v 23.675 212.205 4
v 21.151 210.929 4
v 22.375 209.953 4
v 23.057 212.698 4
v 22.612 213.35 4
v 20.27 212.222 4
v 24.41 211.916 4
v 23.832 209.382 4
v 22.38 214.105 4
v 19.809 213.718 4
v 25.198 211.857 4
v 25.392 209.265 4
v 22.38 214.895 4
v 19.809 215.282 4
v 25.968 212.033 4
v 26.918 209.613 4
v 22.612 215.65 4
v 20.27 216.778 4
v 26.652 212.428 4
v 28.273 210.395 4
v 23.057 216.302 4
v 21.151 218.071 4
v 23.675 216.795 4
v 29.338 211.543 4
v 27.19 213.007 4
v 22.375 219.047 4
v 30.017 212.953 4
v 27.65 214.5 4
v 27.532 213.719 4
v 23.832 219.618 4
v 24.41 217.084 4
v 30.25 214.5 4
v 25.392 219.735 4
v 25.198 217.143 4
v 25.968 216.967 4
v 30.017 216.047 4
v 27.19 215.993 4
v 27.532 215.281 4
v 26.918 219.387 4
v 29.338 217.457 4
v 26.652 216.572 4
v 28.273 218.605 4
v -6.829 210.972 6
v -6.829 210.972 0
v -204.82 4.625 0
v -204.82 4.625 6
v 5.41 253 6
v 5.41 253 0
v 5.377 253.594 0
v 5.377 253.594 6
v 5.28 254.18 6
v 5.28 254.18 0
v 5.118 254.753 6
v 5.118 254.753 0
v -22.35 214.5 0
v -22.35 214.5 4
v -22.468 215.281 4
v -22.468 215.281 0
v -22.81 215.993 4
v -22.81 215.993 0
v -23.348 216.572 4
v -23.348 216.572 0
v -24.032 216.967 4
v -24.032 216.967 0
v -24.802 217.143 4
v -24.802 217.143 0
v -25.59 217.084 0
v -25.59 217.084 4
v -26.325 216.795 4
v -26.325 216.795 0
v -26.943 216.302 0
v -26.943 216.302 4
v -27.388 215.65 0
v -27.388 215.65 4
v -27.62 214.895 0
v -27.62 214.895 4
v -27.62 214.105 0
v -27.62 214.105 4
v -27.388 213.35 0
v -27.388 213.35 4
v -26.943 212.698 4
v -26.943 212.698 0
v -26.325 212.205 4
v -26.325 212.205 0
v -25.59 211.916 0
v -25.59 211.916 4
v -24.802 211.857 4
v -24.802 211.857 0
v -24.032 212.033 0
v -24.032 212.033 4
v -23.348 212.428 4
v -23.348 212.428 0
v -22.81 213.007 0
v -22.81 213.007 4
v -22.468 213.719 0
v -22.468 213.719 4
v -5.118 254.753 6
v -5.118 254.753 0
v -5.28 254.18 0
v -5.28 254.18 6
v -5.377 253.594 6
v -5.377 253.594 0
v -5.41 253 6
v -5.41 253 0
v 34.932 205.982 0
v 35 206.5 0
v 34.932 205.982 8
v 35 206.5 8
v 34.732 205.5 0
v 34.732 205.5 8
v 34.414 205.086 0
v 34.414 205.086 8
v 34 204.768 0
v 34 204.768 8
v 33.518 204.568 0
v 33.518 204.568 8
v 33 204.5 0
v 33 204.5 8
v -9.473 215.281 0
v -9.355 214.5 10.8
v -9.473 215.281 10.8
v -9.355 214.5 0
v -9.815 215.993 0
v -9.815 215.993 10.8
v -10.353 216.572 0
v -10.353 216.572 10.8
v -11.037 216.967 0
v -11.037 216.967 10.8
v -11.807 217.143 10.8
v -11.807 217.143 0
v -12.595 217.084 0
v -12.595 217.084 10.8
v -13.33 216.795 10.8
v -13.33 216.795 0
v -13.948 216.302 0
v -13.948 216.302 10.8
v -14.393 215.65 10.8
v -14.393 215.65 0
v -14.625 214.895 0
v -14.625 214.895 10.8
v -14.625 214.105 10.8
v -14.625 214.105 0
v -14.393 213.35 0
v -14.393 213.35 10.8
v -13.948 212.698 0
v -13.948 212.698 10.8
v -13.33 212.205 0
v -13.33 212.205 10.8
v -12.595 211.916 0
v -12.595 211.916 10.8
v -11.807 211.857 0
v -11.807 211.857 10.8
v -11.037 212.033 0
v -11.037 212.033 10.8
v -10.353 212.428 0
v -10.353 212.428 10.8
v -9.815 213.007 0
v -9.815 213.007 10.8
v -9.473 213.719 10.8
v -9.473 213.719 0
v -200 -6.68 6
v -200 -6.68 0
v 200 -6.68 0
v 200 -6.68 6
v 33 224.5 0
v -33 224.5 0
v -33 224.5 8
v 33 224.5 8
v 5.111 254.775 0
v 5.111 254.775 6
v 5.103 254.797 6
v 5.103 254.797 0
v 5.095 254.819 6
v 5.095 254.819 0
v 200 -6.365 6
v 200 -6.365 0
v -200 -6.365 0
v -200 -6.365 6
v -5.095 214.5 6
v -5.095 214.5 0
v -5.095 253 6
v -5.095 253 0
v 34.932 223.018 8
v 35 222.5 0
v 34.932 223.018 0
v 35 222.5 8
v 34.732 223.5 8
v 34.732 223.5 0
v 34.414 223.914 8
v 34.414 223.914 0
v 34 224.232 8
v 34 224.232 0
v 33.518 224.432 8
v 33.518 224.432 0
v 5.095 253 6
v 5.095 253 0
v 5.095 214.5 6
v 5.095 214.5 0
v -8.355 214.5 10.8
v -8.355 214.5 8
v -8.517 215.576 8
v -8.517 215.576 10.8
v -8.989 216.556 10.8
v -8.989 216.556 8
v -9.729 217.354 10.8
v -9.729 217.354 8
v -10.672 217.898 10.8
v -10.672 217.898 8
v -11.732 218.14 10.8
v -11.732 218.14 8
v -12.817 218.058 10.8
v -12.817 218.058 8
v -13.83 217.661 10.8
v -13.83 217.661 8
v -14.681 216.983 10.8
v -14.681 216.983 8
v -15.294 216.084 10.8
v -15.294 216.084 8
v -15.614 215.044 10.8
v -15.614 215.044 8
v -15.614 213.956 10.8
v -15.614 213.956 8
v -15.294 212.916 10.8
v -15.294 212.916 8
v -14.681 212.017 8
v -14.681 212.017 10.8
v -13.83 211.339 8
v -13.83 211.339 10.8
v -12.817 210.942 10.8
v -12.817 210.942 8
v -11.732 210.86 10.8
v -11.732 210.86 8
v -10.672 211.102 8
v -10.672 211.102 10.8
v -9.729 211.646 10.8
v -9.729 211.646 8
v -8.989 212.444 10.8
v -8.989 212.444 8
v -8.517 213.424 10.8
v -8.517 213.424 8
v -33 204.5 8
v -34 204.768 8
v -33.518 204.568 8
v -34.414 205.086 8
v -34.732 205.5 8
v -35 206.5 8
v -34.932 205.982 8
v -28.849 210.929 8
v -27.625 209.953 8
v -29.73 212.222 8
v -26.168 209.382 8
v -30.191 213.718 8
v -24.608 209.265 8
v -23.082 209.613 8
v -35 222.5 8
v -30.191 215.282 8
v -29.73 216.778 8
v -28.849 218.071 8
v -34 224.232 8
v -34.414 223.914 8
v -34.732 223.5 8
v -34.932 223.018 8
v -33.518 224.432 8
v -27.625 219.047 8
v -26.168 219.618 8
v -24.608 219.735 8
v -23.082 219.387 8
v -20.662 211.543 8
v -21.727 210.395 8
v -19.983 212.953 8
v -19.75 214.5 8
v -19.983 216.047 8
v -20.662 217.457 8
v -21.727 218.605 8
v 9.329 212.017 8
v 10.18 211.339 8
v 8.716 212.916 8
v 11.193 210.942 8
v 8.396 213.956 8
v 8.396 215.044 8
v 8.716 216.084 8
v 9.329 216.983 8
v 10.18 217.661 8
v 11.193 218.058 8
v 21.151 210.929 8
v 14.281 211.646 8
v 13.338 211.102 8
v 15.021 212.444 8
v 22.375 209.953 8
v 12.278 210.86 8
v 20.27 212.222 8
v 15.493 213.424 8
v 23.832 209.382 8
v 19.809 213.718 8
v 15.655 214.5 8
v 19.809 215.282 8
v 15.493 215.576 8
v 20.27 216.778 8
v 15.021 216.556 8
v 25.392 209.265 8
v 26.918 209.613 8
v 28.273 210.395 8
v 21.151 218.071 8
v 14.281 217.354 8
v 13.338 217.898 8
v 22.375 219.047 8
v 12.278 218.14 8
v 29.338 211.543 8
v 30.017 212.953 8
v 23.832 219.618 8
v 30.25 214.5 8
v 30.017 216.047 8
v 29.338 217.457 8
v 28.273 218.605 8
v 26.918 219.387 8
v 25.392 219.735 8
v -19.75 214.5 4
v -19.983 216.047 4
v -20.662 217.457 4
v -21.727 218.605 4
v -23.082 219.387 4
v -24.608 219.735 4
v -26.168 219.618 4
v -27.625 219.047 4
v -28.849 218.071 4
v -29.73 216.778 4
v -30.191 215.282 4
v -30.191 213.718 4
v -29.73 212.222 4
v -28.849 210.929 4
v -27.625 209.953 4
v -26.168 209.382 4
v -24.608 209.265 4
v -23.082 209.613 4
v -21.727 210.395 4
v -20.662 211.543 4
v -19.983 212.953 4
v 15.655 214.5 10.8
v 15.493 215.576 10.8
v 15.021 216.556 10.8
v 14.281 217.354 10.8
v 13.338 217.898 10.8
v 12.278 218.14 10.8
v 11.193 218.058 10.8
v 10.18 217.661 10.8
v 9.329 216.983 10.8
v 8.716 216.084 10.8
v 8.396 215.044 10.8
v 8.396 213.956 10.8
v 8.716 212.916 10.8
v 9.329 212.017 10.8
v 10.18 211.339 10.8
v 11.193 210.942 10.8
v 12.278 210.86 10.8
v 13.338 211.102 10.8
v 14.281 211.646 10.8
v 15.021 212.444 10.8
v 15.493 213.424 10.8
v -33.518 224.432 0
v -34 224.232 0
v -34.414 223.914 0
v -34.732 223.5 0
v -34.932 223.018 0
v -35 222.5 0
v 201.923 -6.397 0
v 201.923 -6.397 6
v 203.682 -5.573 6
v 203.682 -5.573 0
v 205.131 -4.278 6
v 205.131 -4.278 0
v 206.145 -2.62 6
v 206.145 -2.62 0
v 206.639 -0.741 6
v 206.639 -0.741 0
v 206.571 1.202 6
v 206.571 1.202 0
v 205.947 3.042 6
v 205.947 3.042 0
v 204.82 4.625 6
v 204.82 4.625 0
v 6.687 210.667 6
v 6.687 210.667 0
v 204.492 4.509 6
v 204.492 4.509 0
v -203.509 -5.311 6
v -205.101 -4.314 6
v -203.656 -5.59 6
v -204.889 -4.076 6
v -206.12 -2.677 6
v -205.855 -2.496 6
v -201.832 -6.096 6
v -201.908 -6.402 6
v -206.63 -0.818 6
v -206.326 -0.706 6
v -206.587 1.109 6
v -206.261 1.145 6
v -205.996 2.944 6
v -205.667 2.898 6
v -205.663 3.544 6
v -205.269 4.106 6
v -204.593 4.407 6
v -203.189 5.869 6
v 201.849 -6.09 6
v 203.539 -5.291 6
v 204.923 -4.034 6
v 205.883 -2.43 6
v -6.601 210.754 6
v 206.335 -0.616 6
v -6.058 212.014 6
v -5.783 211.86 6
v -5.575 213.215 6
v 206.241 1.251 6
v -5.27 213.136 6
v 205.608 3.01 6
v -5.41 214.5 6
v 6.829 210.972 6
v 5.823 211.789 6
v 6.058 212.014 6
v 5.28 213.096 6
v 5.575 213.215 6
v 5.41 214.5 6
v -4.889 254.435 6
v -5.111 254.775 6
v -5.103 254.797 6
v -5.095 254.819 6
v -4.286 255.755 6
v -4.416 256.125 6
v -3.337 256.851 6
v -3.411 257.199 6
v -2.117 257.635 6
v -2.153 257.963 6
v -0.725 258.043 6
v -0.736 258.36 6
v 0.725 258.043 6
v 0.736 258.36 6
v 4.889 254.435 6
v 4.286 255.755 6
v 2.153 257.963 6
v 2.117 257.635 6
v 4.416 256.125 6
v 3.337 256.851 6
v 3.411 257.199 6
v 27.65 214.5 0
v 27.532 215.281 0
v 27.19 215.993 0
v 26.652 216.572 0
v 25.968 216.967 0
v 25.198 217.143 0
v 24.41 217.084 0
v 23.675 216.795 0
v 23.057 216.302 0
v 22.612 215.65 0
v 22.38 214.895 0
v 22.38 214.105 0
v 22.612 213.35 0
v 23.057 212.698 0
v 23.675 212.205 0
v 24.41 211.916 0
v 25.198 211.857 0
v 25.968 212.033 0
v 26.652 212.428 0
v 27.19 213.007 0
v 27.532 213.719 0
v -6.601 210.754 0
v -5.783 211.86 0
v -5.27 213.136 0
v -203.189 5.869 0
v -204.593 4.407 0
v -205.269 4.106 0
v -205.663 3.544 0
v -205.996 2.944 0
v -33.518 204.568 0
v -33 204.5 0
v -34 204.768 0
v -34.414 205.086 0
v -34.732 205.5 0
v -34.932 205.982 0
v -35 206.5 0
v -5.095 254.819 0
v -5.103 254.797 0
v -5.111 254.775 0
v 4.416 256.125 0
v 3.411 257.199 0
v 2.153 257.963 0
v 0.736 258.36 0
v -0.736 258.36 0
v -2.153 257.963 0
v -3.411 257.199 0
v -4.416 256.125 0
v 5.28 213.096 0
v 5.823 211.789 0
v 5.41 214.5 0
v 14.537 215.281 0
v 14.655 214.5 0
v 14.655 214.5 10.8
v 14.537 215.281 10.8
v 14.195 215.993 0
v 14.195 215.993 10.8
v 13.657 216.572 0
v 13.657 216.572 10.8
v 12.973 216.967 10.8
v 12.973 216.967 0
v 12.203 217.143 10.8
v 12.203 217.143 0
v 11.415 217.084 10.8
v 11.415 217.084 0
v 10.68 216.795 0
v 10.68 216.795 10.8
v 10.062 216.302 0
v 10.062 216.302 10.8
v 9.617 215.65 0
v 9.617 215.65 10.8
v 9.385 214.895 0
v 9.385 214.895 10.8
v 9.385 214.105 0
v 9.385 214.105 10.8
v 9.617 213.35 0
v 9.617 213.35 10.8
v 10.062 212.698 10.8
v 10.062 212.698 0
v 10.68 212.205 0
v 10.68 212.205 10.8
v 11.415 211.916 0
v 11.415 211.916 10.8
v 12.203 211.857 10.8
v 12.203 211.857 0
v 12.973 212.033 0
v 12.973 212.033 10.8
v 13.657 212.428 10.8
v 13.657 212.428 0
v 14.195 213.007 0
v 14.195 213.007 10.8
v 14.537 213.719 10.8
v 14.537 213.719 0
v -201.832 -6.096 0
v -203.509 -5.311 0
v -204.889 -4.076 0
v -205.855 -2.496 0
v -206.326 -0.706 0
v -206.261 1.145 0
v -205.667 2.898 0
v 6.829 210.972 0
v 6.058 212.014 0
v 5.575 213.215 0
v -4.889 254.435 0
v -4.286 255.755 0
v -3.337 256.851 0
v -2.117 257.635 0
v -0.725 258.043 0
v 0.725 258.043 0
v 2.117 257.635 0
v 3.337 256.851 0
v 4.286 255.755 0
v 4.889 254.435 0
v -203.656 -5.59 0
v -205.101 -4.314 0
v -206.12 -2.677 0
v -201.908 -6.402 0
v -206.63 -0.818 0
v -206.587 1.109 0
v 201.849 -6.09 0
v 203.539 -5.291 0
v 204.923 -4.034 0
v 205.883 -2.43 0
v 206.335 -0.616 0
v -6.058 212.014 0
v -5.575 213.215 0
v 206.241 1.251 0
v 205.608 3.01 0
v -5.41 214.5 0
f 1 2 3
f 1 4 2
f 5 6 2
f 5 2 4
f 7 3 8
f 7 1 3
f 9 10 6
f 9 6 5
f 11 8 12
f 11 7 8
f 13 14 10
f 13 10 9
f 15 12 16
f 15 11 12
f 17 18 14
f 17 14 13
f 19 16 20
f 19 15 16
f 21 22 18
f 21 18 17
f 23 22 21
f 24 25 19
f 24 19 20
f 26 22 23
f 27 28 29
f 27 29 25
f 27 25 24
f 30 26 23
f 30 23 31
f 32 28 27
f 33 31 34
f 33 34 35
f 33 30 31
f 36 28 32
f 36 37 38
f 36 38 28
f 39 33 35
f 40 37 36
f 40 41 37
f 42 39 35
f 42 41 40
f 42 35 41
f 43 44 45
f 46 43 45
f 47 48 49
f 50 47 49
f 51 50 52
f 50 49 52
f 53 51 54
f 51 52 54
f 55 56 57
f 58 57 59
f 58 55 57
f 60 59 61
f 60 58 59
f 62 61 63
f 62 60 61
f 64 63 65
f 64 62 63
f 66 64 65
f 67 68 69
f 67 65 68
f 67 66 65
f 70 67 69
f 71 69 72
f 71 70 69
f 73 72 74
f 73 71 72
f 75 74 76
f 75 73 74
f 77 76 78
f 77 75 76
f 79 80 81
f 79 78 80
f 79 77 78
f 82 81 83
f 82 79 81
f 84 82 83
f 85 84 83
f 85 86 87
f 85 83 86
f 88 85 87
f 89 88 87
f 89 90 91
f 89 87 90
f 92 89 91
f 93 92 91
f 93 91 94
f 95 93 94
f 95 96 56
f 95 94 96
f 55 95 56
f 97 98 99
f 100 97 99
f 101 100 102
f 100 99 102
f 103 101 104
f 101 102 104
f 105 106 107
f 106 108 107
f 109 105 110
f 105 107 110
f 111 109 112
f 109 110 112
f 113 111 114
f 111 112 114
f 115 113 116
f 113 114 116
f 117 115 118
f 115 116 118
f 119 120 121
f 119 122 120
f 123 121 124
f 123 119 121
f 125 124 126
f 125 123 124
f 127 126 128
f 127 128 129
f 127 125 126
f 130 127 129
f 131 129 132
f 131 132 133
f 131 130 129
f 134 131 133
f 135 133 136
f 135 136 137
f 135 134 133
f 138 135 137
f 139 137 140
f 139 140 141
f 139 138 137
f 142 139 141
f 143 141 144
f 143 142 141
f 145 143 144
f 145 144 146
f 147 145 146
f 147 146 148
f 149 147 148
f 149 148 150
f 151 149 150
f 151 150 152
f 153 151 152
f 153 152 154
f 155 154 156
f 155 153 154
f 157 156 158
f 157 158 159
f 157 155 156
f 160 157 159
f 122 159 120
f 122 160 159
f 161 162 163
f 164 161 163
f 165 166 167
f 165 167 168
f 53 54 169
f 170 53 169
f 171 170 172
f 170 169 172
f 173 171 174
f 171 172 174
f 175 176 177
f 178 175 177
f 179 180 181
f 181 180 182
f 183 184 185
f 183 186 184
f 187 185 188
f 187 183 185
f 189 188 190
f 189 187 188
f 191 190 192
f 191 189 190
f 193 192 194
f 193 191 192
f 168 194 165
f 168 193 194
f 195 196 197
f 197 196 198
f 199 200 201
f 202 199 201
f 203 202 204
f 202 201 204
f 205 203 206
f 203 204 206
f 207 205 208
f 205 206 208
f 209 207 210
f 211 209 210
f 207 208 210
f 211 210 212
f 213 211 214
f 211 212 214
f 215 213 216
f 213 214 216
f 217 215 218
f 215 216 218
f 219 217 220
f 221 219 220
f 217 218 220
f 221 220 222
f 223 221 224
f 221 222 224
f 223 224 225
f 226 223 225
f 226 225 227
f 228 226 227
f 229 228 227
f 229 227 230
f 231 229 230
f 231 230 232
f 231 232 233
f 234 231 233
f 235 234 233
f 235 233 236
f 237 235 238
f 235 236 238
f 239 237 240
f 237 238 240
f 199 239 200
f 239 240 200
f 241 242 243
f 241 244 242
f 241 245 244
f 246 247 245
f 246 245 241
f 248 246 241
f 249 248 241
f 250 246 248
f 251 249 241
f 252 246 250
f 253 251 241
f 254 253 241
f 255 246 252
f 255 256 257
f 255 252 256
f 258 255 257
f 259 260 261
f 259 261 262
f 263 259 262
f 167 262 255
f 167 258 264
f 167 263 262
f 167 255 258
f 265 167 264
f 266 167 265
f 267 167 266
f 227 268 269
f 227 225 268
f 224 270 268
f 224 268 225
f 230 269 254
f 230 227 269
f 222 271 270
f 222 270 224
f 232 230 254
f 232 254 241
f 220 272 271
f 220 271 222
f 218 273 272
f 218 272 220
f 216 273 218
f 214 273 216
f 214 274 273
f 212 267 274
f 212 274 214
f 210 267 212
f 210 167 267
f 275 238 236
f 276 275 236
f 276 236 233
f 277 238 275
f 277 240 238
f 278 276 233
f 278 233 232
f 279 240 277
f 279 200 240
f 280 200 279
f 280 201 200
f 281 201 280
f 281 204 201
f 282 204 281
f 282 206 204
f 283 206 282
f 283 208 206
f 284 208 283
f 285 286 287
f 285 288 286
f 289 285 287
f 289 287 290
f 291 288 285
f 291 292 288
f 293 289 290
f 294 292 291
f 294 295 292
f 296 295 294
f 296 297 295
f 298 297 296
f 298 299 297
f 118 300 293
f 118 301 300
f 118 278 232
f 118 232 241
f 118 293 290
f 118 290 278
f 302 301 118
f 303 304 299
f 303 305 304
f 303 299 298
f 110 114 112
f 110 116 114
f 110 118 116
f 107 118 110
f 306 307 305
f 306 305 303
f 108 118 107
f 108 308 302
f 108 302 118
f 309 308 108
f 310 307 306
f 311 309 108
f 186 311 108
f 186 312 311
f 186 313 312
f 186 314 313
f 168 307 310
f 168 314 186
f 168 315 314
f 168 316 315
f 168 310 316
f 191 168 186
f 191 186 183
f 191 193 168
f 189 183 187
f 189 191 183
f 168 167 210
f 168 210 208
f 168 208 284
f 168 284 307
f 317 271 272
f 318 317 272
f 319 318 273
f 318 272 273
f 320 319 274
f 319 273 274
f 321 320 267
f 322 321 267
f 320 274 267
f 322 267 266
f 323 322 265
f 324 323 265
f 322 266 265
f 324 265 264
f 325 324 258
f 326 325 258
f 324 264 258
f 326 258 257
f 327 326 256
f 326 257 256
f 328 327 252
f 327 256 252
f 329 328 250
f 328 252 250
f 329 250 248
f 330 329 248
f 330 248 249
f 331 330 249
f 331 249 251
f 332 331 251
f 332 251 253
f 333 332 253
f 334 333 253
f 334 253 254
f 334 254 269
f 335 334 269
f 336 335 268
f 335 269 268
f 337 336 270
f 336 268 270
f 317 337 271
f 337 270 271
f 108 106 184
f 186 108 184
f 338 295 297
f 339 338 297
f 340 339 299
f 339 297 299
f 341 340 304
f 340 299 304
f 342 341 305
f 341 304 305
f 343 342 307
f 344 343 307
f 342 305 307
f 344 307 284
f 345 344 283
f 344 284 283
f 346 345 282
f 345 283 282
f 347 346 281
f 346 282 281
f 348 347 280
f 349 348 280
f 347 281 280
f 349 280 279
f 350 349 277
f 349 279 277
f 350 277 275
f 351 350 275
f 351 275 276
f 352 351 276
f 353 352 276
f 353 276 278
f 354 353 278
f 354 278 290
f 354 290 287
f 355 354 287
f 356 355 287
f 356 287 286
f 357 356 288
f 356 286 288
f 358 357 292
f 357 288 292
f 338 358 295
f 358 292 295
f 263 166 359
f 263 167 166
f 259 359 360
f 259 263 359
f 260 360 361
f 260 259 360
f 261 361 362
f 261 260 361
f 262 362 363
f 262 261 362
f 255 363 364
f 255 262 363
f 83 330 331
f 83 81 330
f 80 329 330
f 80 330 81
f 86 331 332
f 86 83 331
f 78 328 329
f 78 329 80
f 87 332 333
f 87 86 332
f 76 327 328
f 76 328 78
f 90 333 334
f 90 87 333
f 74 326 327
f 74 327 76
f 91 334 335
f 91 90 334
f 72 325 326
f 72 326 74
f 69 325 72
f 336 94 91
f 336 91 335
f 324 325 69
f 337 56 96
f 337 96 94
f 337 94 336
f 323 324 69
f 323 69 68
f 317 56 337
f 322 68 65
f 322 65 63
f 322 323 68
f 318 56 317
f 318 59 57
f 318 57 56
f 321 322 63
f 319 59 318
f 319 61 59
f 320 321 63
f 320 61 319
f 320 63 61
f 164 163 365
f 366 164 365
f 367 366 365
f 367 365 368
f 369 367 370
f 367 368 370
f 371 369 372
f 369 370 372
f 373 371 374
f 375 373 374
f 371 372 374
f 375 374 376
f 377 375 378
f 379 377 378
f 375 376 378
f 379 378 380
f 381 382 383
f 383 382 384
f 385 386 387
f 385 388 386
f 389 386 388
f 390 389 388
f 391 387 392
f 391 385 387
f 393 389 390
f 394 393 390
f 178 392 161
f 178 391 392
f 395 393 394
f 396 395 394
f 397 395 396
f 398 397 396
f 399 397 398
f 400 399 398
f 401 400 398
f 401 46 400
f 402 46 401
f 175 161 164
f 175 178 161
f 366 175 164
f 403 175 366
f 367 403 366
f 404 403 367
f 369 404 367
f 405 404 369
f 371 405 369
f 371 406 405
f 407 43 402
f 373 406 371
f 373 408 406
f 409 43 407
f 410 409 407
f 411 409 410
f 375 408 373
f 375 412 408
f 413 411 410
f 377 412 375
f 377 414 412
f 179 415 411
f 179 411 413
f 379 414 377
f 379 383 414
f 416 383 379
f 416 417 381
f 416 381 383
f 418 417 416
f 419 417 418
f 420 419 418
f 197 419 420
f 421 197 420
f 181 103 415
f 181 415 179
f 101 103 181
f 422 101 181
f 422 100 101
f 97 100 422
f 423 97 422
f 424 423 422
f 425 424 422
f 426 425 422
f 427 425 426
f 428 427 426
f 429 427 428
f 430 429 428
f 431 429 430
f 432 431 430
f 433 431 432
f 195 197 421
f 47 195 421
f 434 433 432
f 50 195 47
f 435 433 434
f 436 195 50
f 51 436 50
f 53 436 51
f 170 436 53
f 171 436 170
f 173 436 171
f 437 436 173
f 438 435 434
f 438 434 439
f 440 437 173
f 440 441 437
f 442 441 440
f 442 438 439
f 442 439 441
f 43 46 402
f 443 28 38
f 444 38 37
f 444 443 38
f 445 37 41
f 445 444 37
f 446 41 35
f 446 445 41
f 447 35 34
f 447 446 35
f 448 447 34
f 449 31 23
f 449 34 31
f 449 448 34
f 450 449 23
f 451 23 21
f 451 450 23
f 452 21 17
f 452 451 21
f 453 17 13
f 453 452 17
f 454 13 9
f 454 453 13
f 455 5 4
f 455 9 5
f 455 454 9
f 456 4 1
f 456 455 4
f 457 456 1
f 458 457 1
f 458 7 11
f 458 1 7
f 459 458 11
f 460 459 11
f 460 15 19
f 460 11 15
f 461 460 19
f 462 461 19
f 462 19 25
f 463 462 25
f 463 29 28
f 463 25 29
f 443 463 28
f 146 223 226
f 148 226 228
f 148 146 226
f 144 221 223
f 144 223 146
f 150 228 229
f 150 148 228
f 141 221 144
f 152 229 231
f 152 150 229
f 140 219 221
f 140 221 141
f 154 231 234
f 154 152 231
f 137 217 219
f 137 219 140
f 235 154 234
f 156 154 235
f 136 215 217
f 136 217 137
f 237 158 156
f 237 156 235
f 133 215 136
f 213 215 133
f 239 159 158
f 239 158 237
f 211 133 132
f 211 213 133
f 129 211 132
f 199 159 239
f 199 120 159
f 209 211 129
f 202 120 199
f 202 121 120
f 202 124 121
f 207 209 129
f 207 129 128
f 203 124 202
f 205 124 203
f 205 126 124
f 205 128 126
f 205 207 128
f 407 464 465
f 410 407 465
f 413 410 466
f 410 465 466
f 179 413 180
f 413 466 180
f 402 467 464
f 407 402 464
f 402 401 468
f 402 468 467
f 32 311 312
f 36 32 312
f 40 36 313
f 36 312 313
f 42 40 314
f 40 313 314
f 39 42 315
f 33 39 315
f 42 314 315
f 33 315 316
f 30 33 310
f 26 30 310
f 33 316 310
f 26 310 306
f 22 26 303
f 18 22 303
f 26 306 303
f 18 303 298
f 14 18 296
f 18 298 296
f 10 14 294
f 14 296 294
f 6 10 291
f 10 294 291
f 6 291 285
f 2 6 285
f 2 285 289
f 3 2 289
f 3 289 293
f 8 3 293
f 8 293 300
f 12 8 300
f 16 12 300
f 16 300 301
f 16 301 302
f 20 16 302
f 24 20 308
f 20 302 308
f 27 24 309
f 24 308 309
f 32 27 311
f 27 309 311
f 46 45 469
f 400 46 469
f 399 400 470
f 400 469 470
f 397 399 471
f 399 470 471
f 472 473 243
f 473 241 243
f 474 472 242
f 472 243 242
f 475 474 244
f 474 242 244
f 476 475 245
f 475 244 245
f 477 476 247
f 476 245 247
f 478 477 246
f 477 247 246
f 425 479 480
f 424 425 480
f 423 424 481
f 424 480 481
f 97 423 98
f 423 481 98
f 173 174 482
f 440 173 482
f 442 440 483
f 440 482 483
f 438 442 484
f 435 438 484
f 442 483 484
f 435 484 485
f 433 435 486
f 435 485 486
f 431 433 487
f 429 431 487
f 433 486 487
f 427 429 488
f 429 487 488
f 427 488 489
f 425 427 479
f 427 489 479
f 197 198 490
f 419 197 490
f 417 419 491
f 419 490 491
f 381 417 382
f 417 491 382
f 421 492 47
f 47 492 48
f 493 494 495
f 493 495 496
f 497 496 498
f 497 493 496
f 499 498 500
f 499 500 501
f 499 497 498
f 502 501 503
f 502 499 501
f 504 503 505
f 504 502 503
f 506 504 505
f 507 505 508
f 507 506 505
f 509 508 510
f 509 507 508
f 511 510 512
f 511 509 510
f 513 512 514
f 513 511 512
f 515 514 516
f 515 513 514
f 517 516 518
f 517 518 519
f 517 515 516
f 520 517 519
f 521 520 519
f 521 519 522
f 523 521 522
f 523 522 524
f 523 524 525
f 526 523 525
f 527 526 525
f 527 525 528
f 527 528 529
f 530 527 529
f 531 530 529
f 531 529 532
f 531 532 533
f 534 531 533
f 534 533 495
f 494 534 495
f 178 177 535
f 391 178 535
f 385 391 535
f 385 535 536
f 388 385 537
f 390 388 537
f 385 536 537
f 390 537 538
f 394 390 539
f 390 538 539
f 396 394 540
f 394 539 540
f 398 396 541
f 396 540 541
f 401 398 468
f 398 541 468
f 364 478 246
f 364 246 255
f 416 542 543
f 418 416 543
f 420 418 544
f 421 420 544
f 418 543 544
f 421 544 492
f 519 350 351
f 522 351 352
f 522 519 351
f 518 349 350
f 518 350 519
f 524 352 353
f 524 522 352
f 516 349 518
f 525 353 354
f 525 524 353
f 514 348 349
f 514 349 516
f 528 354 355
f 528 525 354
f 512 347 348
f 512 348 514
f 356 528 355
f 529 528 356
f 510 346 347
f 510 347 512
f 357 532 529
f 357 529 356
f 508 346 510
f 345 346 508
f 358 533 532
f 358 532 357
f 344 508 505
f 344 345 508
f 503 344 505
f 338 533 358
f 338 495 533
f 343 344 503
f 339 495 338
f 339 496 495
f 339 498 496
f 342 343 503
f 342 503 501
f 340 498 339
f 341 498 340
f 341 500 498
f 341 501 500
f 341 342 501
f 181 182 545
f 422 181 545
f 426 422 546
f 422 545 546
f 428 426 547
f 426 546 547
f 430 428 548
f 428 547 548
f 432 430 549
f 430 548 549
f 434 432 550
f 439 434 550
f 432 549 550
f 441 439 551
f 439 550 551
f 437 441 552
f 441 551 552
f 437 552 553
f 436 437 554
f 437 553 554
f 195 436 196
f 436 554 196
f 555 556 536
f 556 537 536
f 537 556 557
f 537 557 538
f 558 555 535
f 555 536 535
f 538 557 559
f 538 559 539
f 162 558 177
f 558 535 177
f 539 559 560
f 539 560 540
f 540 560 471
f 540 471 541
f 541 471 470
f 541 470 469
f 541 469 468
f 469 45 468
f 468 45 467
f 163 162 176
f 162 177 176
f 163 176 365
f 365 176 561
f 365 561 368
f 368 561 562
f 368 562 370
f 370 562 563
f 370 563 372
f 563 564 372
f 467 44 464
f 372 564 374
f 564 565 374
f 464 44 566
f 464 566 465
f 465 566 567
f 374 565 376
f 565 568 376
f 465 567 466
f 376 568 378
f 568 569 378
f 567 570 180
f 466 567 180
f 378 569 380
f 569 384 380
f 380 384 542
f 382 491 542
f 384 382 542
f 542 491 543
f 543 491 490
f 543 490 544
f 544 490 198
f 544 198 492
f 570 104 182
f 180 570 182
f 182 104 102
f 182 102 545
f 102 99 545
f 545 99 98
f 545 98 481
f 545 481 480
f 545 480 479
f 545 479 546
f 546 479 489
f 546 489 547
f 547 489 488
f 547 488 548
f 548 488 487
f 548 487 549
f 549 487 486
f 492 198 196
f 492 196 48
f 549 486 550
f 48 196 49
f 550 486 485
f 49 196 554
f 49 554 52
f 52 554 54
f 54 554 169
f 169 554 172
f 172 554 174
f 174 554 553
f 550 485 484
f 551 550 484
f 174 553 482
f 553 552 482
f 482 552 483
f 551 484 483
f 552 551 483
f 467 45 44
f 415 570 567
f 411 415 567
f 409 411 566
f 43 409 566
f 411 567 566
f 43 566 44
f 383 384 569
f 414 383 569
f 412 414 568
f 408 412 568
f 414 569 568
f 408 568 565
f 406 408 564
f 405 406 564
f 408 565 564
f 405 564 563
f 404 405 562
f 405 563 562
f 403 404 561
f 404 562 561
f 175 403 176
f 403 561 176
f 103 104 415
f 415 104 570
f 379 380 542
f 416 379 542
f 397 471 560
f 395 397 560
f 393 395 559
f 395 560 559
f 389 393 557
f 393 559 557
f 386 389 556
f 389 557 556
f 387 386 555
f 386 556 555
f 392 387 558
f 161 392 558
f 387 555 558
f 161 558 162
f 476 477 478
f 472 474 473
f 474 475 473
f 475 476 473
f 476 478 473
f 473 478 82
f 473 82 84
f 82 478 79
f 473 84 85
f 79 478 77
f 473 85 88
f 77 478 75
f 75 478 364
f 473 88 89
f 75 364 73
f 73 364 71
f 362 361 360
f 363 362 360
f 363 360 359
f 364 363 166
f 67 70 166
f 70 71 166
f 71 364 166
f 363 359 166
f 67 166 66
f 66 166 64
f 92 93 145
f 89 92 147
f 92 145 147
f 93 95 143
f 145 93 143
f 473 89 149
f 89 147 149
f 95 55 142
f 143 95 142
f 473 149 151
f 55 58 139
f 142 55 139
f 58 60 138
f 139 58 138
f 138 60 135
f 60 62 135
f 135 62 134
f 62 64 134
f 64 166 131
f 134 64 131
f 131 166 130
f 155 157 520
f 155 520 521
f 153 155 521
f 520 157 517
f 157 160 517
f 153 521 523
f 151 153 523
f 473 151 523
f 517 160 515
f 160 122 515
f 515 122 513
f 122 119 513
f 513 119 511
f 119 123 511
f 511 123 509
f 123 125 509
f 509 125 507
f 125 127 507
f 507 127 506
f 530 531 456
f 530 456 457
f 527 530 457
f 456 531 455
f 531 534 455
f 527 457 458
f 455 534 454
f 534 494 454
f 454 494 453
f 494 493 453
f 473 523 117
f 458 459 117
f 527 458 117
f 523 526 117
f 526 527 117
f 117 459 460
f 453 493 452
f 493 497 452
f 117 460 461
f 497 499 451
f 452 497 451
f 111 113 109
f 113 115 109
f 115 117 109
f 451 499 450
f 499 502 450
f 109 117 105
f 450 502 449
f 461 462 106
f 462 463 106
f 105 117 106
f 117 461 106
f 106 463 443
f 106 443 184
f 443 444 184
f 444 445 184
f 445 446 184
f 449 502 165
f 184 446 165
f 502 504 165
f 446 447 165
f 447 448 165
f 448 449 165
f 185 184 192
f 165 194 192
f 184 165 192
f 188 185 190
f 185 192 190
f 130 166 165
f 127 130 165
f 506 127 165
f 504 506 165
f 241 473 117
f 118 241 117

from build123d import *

# Parameters (mm, degrees)
F1_DEPTH = 6
F2_W     = 70
F2_H     = 20
F2_R     = 2.65
F3_DEPTH = 8
F4_R     = 5.25
F5_DEPTH = 4
F6_R     = 3.65
F6_R_2   = 2.65
F7_DEPTH = 2.8
F8_R     = 2


with BuildPart() as f1:
    # F0 (on Top) → F1 (new body)
    with BuildSketch(Plane.XY):
        with BuildLine():
            ThreePointArc((-200, -6.365), (-205.8550143362, -2.496403838), (-204.5927667748, 4.4067809513))
            Line((-204.5927667748, 4.4067809513), (-205.9962283404, 2.9440865629))
            ThreePointArc((-205.9962283404, 2.9440865629), (-205.6696074926, -3.5324143132), (-200, -6.68))
            Line((-200, -6.68), (200, -6.68))
            ThreePointArc((200, -6.68), (206.144775239, -2.6199498588), (204.8200607843, 4.6248690831))
            Line((204.8200607843, 4.6248690831), (6.828621303, 210.9724988056))
            ThreePointArc((6.828621303, 210.9724988056), (5.7779409533, 212.5989640273), (5.41, 214.5))
            Line((5.41, 214.5), (5.41, 253))
            ThreePointArc((5.41, 253), (5.3365496239, 253.8884470225), (5.1181929347, 254.7527695466))
            Line((5.1181929347, 254.7527695466), (5.095, 254.7818723))
            Line((5.095, 254.7818723), (5.095, 254.8190863091))
            ThreePointArc((5.095, 254.8190863091), (0, 258.41), (-5.095, 254.8190863091))
            Line((-5.095, 254.8190863091), (-5.095, 254.7818723))
            Line((-5.095, 254.7818723), (-5.1181929347, 254.7527695466))
            ThreePointArc((-5.1181929347, 254.7527695466), (-5.3365496239, 253.8884470225), (-5.41, 253))
            Line((-5.41, 253), (-5.41, 214.5))
            ThreePointArc((-5.41, 214.5), (-5.7779409533, 212.5989640273), (-6.828621303, 210.9724988056))
            Line((-6.828621303, 210.9724988056), (-204.8200607843, 4.6248690831))
            ThreePointArc((-204.8200607843, 4.6248690831), (-204.052746223, 5.3101457656), (-203.1893066572, 5.8694738304))
            Line((-203.1893066572, 5.8694738304), (-6.6013280175, 210.7544099192))
            ThreePointArc((-6.6013280175, 210.7544099192), (-5.4856890201, 212.481431872), (-5.095, 214.5))
            Line((-5.095, 214.5), (-5.095, 253))
            ThreePointArc((-5.095, 253), (0, 258.095), (5.095, 253))
            Line((5.095, 253), (5.095, 214.5))
            ThreePointArc((5.095, 214.5), (5.5088128874, 212.4248579962), (6.6869461501, 210.6671727408))
            Line((6.6869461501, 210.6671727408), (204.4920356293, 4.5094169141))
            ThreePointArc((204.4920356293, 4.5094169141), (205.8828421557, -2.4301014734), (200, -6.365))
            Line((200, -6.365), (-200, -6.365))
        make_face()
        with BuildLine():
            Line((-205.9962283404, 2.9440865629), (-204.5927667748, 4.4067809513))
            Line((-204.5927667748, 4.4067809513), (-203.1893066572, 5.8694738304))
            ThreePointArc((-203.1893066572, 5.8694738304), (-204.052746223, 5.3101457656), (-204.8200607843, 4.6248690831))
            ThreePointArc((-204.8200607843, 4.6248690831), (-205.4730508016, 3.8298975081), (-205.9962283404, 2.9440865629))
        make_face()
        with BuildLine():
            ThreePointArc((-5.095, 254.8190863091), (-5.1067041189, 254.7859655768), (-5.1181929347, 254.7527695466))
            Line((-5.1181929347, 254.7527695466), (-5.095, 254.7818723))
            Line((-5.095, 254.7818723), (-5.095, 254.8190863091))
        make_face()
        with BuildLine():
            ThreePointArc((5.1181929347, 254.7527695466), (5.1067041189, 254.7859655768), (5.095, 254.8190863091))
            Line((5.095, 254.8190863091), (5.095, 254.7818723))
            Line((5.095, 254.7818723), (5.1181929347, 254.7527695466))
        make_face()
    extrude(amount=F1_DEPTH)


with BuildPart() as f3:
    # F2 (on Top) → F3 (new body)
    with BuildSketch(Plane.XY):
        with Locations((0, 214.5)):
            Rectangle(F2_W, F2_H)
        with Locations((-25, 214.5)):
            Circle(F2_R, mode=Mode.SUBTRACT)
        with Locations((-12.005, 214.5)):
            Circle(F2_R, mode=Mode.SUBTRACT)
        with Locations((12.005, 214.5)):
            Circle(F2_R, mode=Mode.SUBTRACT)
        with Locations((25, 214.5)):
            Circle(F2_R, mode=Mode.SUBTRACT)
    extrude(amount=F3_DEPTH)

    # F4 (on face) → F5 (cut)
    with BuildSketch(Plane.XY.offset(8)):
        with Locations((-25, 214.5)):
            Circle(F4_R)
        with Locations((25, 214.5)):
            Circle(F4_R)
    extrude(amount=-F5_DEPTH, mode=Mode.SUBTRACT)

    # F6 (on face) → F7 (join)
    with BuildSketch(Plane.XY.offset(8)):
        with Locations((-12.005, 214.5)):
            Circle(F6_R)
        with Locations((-12.005, 214.5)):
            Circle(F6_R_2, mode=Mode.SUBTRACT)
        with Locations((12.005, 214.5)):
            Circle(F6_R)
        with Locations((12.005, 214.5)):
            Circle(F6_R_2, mode=Mode.SUBTRACT)
    extrude(amount=F7_DEPTH)

    # F8
    f8_edges = [f3.edges().sort_by_distance(p)[0] for p in [
        (-35, 204.5, 4),
        (-35, 224.5, 4),
        (35, 224.5, 4),
        (35, 204.5, 4),
    ]]
    fillet(f8_edges, radius=F8_R)


solid = Compound([f1.part, f3.part])
